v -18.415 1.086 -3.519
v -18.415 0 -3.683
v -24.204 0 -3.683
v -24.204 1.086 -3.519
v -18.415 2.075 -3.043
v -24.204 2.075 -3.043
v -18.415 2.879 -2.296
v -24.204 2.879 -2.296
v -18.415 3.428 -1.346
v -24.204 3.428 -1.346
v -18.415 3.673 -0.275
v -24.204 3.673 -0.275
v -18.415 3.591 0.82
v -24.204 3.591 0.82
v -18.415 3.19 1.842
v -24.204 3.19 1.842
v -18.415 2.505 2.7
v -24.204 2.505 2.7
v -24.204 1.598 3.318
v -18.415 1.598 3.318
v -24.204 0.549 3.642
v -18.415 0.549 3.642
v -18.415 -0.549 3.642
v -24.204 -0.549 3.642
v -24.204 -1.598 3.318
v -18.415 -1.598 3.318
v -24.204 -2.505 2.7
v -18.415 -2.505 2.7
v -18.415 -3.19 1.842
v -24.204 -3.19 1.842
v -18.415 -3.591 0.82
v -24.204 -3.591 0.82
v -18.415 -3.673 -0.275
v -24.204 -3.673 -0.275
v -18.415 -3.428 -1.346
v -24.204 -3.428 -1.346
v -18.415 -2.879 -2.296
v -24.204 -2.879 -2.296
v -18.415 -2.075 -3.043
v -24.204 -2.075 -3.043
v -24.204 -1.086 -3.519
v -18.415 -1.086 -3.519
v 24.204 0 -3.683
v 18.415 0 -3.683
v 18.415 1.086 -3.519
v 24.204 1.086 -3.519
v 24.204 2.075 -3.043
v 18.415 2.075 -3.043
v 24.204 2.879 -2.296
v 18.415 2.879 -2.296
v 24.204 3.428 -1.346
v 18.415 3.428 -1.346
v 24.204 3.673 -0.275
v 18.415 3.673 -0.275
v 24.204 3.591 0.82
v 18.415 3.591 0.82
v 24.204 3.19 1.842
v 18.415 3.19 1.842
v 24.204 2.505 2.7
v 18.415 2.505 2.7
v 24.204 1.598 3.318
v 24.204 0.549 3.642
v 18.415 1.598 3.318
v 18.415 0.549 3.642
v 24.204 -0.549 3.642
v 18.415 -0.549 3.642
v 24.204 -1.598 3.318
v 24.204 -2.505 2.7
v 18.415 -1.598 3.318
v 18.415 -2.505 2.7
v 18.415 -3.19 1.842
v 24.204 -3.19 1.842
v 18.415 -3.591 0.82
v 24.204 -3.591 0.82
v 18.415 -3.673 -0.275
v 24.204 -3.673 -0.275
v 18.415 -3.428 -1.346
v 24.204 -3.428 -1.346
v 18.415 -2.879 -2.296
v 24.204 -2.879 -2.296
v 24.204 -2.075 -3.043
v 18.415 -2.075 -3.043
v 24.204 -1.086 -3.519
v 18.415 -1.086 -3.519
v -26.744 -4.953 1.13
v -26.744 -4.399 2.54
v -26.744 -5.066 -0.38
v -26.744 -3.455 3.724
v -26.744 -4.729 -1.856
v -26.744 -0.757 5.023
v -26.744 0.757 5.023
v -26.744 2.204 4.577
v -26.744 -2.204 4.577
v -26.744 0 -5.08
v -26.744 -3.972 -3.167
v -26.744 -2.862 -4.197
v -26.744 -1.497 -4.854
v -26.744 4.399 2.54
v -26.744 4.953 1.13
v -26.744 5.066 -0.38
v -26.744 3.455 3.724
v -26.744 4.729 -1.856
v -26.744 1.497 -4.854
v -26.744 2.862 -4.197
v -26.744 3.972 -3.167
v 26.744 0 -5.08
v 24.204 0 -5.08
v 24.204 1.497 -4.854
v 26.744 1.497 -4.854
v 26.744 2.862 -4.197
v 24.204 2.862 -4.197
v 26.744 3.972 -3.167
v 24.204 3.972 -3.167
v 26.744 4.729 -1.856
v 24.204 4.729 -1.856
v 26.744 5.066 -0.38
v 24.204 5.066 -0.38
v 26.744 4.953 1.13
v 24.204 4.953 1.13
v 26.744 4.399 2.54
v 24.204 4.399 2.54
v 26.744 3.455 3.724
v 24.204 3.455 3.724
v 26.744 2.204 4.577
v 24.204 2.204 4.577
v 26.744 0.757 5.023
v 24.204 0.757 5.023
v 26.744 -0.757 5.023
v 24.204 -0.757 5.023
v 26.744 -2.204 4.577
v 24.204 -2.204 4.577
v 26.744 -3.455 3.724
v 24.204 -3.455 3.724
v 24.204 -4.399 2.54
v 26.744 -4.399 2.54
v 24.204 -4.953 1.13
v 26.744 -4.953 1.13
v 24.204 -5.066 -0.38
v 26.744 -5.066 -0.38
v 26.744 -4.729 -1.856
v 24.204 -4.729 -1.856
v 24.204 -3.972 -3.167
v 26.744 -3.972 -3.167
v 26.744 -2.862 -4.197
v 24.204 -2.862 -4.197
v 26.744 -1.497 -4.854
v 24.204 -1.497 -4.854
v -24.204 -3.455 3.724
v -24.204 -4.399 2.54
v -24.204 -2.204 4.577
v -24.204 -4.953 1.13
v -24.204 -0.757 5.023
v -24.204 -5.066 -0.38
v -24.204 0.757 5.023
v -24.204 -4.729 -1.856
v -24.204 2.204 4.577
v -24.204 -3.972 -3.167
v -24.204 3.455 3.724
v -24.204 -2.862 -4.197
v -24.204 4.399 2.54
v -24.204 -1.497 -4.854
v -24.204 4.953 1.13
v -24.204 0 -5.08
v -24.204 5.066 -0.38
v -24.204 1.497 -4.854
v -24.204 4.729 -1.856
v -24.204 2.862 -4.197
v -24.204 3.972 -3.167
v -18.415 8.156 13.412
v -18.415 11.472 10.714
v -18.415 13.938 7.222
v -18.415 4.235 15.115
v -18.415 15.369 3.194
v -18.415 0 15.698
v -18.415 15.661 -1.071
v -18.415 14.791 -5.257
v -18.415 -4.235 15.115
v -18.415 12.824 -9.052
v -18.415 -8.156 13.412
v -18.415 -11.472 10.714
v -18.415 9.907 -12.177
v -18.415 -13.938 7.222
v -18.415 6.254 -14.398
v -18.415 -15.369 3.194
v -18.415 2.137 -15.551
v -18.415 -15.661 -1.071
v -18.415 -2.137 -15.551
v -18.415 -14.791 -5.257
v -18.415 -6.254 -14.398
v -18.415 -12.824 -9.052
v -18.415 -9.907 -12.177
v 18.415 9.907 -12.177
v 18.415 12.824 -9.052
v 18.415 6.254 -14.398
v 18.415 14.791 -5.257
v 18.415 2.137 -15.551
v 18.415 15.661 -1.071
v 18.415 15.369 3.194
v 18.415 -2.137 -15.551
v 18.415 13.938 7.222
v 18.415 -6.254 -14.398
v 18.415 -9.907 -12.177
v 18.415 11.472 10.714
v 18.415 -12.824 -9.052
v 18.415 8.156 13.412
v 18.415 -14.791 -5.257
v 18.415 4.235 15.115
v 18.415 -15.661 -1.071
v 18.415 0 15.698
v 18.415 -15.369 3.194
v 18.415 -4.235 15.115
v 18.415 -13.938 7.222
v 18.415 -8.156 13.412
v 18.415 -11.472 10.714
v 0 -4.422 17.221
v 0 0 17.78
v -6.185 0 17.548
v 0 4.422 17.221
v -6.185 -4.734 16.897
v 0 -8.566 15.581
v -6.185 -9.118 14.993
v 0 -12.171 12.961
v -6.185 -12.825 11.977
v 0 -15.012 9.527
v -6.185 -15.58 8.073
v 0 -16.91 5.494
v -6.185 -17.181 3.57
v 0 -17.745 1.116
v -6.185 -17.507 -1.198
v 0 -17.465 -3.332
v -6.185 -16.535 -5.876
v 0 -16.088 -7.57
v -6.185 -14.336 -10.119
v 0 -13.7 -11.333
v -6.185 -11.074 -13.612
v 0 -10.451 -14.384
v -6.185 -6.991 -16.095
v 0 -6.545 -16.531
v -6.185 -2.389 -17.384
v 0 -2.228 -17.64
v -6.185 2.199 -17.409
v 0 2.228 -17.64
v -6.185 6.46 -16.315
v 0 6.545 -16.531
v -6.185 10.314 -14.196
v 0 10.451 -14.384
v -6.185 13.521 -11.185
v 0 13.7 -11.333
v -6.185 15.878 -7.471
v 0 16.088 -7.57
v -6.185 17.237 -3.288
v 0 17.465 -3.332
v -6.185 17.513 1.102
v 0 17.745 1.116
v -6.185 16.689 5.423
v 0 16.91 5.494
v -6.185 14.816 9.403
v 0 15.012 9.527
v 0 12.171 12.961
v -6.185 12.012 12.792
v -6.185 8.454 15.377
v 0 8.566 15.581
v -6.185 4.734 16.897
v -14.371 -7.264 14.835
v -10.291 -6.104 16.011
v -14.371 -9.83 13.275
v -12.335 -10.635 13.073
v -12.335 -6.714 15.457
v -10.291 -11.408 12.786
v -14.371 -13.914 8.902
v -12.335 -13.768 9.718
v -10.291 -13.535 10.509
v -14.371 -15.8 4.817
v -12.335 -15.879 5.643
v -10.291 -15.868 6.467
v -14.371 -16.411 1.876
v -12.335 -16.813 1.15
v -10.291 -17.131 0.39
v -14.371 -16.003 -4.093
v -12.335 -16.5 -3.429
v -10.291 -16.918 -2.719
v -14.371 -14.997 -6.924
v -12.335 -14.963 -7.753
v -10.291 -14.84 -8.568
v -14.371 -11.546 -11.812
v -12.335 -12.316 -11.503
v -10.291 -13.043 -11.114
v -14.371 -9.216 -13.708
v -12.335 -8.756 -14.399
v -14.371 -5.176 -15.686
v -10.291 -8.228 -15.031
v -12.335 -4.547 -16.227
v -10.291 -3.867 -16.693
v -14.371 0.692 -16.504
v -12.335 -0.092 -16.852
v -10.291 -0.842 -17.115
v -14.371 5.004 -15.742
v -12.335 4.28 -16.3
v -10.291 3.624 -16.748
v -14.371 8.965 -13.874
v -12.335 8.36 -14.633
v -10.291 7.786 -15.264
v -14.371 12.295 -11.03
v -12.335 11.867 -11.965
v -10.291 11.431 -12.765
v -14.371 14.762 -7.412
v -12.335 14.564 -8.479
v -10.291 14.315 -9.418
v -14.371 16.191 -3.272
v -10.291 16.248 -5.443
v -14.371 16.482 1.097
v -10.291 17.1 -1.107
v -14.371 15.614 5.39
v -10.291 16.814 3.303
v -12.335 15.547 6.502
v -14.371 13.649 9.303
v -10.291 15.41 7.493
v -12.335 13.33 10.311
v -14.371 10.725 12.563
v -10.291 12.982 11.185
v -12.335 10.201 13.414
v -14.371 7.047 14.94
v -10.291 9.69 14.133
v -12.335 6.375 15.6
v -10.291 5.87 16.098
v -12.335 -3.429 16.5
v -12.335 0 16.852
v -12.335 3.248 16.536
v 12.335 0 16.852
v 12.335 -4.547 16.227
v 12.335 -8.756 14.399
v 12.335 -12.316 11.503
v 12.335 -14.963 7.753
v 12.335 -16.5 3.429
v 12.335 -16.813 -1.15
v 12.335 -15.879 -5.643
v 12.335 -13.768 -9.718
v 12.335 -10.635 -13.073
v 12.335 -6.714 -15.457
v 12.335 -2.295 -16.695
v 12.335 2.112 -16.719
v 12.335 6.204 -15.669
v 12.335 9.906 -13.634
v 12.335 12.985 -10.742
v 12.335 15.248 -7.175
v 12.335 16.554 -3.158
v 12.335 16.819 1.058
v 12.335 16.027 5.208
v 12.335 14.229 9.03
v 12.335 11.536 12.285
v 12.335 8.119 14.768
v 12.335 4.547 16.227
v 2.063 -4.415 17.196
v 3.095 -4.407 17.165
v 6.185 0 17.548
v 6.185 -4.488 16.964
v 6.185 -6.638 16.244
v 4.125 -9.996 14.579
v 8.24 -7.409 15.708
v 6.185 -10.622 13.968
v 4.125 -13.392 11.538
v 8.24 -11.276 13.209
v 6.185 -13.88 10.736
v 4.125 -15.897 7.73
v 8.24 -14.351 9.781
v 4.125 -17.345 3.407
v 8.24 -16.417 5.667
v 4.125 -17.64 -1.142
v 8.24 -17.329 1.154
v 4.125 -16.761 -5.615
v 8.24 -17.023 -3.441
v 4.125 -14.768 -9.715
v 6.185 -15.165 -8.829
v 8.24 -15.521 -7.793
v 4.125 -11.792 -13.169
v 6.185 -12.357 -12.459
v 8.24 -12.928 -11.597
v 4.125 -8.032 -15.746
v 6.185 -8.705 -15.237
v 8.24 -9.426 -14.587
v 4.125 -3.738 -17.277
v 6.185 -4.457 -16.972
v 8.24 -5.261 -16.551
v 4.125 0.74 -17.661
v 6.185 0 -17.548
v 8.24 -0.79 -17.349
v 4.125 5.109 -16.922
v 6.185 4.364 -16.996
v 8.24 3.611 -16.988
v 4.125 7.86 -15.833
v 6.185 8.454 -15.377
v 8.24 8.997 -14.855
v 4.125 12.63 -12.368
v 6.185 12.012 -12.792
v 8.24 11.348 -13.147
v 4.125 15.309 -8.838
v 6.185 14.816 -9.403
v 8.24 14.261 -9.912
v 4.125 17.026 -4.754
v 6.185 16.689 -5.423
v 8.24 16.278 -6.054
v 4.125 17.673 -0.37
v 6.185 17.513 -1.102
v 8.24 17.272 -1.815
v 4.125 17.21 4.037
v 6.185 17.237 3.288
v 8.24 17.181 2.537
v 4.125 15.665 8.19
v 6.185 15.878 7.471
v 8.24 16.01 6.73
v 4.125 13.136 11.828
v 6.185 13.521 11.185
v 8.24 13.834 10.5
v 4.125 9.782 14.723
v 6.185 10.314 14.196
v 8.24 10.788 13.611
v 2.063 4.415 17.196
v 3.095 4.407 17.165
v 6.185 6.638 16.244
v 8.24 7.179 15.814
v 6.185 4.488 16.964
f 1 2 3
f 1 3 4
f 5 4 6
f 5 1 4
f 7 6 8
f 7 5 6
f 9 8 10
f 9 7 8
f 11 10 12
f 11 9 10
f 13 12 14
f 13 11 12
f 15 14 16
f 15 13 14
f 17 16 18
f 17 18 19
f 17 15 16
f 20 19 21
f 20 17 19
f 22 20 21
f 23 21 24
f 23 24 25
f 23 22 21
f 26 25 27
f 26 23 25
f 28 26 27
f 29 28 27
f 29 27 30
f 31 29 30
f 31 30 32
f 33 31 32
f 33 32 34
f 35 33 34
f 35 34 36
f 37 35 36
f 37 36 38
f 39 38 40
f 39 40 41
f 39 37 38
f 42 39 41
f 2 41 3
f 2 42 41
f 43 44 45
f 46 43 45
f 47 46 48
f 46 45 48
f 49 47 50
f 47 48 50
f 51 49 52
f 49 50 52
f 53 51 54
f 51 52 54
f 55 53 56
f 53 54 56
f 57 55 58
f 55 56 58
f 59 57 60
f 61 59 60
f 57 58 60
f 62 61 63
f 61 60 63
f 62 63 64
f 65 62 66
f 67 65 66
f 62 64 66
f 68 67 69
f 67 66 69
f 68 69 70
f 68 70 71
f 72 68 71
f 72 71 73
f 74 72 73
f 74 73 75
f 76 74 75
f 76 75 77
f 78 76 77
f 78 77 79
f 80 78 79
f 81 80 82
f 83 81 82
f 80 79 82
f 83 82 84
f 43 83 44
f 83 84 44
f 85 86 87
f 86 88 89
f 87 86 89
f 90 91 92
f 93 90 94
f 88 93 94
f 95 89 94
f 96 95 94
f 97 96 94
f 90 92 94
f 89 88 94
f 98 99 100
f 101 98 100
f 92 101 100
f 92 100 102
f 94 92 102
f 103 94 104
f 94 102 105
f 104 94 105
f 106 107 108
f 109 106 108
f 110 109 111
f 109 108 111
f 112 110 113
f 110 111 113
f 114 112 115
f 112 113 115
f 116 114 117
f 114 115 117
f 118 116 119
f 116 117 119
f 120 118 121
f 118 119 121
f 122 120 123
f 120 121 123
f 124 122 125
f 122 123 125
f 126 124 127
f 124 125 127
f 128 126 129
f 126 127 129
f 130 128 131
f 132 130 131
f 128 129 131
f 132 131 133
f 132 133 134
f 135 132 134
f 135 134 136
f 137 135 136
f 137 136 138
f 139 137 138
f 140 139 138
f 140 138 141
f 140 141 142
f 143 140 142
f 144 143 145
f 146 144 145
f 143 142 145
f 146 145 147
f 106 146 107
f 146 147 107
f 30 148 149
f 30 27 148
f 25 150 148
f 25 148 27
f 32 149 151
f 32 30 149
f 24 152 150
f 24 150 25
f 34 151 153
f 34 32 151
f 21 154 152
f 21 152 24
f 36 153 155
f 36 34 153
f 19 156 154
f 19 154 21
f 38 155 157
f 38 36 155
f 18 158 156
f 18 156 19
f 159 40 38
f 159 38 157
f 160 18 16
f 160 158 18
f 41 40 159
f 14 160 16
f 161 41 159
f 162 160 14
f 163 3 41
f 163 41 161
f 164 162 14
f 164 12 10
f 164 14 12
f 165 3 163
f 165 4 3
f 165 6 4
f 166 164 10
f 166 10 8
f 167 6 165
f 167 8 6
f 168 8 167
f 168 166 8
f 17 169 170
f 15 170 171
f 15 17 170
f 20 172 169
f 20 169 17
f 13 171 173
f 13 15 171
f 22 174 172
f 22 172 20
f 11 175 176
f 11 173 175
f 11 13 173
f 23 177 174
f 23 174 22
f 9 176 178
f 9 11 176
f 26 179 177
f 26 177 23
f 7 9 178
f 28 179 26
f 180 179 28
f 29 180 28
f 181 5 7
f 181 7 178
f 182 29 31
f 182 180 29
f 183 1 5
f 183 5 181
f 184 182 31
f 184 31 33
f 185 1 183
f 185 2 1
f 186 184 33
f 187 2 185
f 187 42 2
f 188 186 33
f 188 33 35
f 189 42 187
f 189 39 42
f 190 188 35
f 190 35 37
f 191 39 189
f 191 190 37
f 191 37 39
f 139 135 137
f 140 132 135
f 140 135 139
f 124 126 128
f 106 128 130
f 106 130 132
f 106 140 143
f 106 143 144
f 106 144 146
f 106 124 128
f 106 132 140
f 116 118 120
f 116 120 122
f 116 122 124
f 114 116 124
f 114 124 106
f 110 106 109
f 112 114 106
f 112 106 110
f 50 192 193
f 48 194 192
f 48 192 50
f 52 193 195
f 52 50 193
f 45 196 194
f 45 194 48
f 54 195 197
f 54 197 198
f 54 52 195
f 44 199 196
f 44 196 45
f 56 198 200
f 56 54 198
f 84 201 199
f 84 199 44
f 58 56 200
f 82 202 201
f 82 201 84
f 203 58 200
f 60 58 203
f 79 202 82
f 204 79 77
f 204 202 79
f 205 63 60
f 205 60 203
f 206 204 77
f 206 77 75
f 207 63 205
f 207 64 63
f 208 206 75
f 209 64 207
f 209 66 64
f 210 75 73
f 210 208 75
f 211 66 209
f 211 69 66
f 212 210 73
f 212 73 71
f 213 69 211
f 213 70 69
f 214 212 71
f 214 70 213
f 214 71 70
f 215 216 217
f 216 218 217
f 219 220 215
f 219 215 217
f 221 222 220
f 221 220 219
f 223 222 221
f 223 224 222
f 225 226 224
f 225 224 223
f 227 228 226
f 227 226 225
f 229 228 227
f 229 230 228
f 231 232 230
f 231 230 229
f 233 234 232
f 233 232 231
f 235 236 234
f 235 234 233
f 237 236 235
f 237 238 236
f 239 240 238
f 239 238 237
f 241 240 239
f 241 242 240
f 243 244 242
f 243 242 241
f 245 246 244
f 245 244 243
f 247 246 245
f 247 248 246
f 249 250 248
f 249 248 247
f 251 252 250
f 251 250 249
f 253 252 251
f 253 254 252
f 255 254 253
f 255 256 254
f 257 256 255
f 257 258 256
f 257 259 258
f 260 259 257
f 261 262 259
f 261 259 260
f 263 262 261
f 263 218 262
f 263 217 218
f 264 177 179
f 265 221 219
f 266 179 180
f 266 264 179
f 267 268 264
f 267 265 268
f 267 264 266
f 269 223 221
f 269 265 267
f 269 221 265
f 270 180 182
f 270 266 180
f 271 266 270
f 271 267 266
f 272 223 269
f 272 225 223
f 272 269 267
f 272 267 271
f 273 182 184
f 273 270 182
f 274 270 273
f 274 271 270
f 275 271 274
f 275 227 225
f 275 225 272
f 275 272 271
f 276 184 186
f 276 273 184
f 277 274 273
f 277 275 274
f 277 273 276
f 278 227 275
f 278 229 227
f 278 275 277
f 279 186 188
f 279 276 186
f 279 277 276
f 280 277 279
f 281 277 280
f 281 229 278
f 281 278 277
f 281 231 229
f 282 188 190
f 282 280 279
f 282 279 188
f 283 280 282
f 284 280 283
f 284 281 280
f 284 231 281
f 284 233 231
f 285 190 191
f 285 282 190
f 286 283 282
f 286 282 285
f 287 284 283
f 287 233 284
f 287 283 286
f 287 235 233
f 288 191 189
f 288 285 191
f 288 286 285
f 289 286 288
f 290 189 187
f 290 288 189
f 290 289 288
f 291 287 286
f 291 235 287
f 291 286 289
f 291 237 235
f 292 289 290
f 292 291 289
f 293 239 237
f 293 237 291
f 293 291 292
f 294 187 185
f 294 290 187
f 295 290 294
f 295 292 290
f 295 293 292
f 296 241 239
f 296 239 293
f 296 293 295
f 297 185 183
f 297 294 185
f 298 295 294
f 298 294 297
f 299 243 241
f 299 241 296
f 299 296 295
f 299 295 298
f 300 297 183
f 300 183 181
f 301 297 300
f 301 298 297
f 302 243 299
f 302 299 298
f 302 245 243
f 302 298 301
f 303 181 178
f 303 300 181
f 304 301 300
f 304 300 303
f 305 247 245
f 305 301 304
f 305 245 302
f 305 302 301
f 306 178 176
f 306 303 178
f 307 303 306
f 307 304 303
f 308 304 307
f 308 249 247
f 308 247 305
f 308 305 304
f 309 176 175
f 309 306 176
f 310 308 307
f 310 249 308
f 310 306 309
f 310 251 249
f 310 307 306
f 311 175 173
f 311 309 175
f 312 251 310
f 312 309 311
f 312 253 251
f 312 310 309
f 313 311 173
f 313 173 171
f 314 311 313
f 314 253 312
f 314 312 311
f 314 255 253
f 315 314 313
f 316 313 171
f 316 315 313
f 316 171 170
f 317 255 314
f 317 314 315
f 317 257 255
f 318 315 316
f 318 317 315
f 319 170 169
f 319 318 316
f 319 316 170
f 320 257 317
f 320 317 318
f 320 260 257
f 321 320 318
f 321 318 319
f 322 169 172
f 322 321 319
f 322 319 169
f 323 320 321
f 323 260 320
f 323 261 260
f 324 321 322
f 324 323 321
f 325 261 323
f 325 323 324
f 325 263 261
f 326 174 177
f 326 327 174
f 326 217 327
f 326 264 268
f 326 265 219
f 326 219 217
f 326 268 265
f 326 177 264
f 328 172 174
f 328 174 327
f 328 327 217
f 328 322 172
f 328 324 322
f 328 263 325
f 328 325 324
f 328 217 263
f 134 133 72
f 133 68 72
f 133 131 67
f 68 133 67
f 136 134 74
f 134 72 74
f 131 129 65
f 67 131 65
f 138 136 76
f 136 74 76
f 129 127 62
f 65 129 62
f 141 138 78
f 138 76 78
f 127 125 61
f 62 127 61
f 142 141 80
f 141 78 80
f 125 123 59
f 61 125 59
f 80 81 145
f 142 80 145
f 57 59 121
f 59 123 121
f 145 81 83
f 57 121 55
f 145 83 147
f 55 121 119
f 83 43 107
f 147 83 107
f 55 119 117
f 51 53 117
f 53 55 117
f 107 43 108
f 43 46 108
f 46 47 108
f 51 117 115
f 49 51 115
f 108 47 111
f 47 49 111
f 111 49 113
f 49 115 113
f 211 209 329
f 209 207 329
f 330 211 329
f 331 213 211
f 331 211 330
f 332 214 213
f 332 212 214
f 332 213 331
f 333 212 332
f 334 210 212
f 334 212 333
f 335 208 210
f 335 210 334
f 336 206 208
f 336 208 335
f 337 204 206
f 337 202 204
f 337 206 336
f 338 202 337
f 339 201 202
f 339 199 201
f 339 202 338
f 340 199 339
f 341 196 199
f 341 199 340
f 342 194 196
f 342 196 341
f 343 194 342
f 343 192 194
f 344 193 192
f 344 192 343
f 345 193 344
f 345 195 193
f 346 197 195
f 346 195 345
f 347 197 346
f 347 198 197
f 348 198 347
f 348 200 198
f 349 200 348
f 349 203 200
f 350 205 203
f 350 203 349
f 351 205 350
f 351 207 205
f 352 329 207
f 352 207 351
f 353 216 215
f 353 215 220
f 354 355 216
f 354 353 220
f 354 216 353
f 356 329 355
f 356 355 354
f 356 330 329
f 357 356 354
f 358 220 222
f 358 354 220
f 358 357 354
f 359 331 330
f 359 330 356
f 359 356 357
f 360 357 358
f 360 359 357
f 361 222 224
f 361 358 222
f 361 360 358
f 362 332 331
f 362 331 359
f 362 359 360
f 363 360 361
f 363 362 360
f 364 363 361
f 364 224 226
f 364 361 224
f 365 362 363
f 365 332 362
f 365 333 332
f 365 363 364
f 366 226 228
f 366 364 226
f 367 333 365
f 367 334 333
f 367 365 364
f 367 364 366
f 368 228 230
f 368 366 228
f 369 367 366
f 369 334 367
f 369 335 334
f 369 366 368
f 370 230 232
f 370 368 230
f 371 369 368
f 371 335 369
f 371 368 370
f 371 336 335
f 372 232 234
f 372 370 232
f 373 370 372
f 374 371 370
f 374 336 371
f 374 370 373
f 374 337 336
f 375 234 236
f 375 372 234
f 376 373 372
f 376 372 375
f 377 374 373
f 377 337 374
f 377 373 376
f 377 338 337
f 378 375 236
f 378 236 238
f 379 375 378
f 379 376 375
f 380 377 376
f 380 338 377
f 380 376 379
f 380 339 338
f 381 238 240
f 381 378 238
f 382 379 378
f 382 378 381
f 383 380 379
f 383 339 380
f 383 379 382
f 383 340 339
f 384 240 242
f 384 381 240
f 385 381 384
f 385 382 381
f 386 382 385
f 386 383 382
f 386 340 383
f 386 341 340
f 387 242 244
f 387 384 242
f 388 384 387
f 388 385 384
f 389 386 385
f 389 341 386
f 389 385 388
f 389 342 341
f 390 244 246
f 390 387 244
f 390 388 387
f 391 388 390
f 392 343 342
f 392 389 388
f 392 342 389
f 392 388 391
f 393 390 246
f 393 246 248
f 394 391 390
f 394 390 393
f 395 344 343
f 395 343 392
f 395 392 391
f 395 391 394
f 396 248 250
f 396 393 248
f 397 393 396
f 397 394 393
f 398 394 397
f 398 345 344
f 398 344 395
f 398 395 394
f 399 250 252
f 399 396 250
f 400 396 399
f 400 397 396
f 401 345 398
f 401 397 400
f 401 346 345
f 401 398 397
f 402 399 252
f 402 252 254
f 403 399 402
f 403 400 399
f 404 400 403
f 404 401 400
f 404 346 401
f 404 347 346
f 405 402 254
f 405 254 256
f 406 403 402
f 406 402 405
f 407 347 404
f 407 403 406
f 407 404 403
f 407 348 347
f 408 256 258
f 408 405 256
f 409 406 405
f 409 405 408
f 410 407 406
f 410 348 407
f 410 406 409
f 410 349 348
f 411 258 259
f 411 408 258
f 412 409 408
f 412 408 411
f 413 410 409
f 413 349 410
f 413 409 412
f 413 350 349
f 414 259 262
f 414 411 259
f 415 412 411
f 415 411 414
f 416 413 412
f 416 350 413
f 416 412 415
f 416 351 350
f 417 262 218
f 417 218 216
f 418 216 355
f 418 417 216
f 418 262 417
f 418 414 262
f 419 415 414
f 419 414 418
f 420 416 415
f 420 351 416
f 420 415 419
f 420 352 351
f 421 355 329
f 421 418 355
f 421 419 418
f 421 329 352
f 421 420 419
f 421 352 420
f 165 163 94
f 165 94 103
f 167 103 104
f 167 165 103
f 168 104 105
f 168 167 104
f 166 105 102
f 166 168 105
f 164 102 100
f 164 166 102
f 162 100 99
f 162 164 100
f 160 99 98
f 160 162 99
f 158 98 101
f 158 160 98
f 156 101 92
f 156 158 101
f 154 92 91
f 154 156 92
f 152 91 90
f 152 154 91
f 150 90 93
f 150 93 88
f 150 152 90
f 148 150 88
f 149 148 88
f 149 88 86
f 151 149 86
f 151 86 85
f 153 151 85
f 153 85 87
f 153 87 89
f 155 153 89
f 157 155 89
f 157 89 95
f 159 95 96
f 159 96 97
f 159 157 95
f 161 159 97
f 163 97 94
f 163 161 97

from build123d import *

# Parameters (mm, degrees)
SKETCH4_R           = 3.683
BOSS_EXTRUDE1_DEPTH = 5.789022458
SKETCH5_R           = 5.08
BOSS_EXTRUDE2_DEPTH = 2.54


with BuildPart() as part:
    # Sketch2 → Revolve1 (revolve)
    with BuildSketch(Plane.XY, mode=Mode.PRIVATE) as revolve1_sk:
        with BuildLine():
            Line((-18.415, 0), (-18.415, 15.697572511))
            ThreePointArc((-18.415, 15.697572511), (-9.266184884, 17.257739329), (0, 17.78))
            ThreePointArc((0, 17.78), (9.266184884, 17.257739329), (18.415, 15.697572511))
            Line((18.415, 15.697572511), (18.415, 0))
            Line((18.415, 0), (-18.415, 0))
        make_face()
    revolve(revolve1_sk.sketch.rotate(Axis((-18.415, 0, 0), (1, 0, 0)), 90), axis=Axis((-18.415, 0, 0), (1, 0, 0)))

    # Sketch4 → Boss-Extrude1 (add)
    with BuildSketch(Plane(origin=(18.415, 0, 0), x_dir=(0, 0, -1), z_dir=(1, 0, 0))):
        Circle(SKETCH4_R)
    boss_extrude1 = extrude(amount=BOSS_EXTRUDE1_DEPTH)

    # Sketch5 → Boss-Extrude2 (add)
    with BuildSketch(Plane(origin=(24.204022458, 0, 0), x_dir=(0, 0, -1), z_dir=(1, 0, 0))):
        Circle(SKETCH5_R)
    boss_extrude2 = extrude(amount=BOSS_EXTRUDE2_DEPTH)

    # Mirror1: Boss-Extrude1, Boss-Extrude2 across plane
    add(boss_extrude1.mirror(Plane(origin=(0, 0, 0), x_dir=(0, 0, 1), z_dir=(1, 0, 0))))
    add(boss_extrude2.mirror(Plane(origin=(0, 0, 0), x_dir=(0, 0, 1), z_dir=(1, 0, 0))))


solid = part.part
